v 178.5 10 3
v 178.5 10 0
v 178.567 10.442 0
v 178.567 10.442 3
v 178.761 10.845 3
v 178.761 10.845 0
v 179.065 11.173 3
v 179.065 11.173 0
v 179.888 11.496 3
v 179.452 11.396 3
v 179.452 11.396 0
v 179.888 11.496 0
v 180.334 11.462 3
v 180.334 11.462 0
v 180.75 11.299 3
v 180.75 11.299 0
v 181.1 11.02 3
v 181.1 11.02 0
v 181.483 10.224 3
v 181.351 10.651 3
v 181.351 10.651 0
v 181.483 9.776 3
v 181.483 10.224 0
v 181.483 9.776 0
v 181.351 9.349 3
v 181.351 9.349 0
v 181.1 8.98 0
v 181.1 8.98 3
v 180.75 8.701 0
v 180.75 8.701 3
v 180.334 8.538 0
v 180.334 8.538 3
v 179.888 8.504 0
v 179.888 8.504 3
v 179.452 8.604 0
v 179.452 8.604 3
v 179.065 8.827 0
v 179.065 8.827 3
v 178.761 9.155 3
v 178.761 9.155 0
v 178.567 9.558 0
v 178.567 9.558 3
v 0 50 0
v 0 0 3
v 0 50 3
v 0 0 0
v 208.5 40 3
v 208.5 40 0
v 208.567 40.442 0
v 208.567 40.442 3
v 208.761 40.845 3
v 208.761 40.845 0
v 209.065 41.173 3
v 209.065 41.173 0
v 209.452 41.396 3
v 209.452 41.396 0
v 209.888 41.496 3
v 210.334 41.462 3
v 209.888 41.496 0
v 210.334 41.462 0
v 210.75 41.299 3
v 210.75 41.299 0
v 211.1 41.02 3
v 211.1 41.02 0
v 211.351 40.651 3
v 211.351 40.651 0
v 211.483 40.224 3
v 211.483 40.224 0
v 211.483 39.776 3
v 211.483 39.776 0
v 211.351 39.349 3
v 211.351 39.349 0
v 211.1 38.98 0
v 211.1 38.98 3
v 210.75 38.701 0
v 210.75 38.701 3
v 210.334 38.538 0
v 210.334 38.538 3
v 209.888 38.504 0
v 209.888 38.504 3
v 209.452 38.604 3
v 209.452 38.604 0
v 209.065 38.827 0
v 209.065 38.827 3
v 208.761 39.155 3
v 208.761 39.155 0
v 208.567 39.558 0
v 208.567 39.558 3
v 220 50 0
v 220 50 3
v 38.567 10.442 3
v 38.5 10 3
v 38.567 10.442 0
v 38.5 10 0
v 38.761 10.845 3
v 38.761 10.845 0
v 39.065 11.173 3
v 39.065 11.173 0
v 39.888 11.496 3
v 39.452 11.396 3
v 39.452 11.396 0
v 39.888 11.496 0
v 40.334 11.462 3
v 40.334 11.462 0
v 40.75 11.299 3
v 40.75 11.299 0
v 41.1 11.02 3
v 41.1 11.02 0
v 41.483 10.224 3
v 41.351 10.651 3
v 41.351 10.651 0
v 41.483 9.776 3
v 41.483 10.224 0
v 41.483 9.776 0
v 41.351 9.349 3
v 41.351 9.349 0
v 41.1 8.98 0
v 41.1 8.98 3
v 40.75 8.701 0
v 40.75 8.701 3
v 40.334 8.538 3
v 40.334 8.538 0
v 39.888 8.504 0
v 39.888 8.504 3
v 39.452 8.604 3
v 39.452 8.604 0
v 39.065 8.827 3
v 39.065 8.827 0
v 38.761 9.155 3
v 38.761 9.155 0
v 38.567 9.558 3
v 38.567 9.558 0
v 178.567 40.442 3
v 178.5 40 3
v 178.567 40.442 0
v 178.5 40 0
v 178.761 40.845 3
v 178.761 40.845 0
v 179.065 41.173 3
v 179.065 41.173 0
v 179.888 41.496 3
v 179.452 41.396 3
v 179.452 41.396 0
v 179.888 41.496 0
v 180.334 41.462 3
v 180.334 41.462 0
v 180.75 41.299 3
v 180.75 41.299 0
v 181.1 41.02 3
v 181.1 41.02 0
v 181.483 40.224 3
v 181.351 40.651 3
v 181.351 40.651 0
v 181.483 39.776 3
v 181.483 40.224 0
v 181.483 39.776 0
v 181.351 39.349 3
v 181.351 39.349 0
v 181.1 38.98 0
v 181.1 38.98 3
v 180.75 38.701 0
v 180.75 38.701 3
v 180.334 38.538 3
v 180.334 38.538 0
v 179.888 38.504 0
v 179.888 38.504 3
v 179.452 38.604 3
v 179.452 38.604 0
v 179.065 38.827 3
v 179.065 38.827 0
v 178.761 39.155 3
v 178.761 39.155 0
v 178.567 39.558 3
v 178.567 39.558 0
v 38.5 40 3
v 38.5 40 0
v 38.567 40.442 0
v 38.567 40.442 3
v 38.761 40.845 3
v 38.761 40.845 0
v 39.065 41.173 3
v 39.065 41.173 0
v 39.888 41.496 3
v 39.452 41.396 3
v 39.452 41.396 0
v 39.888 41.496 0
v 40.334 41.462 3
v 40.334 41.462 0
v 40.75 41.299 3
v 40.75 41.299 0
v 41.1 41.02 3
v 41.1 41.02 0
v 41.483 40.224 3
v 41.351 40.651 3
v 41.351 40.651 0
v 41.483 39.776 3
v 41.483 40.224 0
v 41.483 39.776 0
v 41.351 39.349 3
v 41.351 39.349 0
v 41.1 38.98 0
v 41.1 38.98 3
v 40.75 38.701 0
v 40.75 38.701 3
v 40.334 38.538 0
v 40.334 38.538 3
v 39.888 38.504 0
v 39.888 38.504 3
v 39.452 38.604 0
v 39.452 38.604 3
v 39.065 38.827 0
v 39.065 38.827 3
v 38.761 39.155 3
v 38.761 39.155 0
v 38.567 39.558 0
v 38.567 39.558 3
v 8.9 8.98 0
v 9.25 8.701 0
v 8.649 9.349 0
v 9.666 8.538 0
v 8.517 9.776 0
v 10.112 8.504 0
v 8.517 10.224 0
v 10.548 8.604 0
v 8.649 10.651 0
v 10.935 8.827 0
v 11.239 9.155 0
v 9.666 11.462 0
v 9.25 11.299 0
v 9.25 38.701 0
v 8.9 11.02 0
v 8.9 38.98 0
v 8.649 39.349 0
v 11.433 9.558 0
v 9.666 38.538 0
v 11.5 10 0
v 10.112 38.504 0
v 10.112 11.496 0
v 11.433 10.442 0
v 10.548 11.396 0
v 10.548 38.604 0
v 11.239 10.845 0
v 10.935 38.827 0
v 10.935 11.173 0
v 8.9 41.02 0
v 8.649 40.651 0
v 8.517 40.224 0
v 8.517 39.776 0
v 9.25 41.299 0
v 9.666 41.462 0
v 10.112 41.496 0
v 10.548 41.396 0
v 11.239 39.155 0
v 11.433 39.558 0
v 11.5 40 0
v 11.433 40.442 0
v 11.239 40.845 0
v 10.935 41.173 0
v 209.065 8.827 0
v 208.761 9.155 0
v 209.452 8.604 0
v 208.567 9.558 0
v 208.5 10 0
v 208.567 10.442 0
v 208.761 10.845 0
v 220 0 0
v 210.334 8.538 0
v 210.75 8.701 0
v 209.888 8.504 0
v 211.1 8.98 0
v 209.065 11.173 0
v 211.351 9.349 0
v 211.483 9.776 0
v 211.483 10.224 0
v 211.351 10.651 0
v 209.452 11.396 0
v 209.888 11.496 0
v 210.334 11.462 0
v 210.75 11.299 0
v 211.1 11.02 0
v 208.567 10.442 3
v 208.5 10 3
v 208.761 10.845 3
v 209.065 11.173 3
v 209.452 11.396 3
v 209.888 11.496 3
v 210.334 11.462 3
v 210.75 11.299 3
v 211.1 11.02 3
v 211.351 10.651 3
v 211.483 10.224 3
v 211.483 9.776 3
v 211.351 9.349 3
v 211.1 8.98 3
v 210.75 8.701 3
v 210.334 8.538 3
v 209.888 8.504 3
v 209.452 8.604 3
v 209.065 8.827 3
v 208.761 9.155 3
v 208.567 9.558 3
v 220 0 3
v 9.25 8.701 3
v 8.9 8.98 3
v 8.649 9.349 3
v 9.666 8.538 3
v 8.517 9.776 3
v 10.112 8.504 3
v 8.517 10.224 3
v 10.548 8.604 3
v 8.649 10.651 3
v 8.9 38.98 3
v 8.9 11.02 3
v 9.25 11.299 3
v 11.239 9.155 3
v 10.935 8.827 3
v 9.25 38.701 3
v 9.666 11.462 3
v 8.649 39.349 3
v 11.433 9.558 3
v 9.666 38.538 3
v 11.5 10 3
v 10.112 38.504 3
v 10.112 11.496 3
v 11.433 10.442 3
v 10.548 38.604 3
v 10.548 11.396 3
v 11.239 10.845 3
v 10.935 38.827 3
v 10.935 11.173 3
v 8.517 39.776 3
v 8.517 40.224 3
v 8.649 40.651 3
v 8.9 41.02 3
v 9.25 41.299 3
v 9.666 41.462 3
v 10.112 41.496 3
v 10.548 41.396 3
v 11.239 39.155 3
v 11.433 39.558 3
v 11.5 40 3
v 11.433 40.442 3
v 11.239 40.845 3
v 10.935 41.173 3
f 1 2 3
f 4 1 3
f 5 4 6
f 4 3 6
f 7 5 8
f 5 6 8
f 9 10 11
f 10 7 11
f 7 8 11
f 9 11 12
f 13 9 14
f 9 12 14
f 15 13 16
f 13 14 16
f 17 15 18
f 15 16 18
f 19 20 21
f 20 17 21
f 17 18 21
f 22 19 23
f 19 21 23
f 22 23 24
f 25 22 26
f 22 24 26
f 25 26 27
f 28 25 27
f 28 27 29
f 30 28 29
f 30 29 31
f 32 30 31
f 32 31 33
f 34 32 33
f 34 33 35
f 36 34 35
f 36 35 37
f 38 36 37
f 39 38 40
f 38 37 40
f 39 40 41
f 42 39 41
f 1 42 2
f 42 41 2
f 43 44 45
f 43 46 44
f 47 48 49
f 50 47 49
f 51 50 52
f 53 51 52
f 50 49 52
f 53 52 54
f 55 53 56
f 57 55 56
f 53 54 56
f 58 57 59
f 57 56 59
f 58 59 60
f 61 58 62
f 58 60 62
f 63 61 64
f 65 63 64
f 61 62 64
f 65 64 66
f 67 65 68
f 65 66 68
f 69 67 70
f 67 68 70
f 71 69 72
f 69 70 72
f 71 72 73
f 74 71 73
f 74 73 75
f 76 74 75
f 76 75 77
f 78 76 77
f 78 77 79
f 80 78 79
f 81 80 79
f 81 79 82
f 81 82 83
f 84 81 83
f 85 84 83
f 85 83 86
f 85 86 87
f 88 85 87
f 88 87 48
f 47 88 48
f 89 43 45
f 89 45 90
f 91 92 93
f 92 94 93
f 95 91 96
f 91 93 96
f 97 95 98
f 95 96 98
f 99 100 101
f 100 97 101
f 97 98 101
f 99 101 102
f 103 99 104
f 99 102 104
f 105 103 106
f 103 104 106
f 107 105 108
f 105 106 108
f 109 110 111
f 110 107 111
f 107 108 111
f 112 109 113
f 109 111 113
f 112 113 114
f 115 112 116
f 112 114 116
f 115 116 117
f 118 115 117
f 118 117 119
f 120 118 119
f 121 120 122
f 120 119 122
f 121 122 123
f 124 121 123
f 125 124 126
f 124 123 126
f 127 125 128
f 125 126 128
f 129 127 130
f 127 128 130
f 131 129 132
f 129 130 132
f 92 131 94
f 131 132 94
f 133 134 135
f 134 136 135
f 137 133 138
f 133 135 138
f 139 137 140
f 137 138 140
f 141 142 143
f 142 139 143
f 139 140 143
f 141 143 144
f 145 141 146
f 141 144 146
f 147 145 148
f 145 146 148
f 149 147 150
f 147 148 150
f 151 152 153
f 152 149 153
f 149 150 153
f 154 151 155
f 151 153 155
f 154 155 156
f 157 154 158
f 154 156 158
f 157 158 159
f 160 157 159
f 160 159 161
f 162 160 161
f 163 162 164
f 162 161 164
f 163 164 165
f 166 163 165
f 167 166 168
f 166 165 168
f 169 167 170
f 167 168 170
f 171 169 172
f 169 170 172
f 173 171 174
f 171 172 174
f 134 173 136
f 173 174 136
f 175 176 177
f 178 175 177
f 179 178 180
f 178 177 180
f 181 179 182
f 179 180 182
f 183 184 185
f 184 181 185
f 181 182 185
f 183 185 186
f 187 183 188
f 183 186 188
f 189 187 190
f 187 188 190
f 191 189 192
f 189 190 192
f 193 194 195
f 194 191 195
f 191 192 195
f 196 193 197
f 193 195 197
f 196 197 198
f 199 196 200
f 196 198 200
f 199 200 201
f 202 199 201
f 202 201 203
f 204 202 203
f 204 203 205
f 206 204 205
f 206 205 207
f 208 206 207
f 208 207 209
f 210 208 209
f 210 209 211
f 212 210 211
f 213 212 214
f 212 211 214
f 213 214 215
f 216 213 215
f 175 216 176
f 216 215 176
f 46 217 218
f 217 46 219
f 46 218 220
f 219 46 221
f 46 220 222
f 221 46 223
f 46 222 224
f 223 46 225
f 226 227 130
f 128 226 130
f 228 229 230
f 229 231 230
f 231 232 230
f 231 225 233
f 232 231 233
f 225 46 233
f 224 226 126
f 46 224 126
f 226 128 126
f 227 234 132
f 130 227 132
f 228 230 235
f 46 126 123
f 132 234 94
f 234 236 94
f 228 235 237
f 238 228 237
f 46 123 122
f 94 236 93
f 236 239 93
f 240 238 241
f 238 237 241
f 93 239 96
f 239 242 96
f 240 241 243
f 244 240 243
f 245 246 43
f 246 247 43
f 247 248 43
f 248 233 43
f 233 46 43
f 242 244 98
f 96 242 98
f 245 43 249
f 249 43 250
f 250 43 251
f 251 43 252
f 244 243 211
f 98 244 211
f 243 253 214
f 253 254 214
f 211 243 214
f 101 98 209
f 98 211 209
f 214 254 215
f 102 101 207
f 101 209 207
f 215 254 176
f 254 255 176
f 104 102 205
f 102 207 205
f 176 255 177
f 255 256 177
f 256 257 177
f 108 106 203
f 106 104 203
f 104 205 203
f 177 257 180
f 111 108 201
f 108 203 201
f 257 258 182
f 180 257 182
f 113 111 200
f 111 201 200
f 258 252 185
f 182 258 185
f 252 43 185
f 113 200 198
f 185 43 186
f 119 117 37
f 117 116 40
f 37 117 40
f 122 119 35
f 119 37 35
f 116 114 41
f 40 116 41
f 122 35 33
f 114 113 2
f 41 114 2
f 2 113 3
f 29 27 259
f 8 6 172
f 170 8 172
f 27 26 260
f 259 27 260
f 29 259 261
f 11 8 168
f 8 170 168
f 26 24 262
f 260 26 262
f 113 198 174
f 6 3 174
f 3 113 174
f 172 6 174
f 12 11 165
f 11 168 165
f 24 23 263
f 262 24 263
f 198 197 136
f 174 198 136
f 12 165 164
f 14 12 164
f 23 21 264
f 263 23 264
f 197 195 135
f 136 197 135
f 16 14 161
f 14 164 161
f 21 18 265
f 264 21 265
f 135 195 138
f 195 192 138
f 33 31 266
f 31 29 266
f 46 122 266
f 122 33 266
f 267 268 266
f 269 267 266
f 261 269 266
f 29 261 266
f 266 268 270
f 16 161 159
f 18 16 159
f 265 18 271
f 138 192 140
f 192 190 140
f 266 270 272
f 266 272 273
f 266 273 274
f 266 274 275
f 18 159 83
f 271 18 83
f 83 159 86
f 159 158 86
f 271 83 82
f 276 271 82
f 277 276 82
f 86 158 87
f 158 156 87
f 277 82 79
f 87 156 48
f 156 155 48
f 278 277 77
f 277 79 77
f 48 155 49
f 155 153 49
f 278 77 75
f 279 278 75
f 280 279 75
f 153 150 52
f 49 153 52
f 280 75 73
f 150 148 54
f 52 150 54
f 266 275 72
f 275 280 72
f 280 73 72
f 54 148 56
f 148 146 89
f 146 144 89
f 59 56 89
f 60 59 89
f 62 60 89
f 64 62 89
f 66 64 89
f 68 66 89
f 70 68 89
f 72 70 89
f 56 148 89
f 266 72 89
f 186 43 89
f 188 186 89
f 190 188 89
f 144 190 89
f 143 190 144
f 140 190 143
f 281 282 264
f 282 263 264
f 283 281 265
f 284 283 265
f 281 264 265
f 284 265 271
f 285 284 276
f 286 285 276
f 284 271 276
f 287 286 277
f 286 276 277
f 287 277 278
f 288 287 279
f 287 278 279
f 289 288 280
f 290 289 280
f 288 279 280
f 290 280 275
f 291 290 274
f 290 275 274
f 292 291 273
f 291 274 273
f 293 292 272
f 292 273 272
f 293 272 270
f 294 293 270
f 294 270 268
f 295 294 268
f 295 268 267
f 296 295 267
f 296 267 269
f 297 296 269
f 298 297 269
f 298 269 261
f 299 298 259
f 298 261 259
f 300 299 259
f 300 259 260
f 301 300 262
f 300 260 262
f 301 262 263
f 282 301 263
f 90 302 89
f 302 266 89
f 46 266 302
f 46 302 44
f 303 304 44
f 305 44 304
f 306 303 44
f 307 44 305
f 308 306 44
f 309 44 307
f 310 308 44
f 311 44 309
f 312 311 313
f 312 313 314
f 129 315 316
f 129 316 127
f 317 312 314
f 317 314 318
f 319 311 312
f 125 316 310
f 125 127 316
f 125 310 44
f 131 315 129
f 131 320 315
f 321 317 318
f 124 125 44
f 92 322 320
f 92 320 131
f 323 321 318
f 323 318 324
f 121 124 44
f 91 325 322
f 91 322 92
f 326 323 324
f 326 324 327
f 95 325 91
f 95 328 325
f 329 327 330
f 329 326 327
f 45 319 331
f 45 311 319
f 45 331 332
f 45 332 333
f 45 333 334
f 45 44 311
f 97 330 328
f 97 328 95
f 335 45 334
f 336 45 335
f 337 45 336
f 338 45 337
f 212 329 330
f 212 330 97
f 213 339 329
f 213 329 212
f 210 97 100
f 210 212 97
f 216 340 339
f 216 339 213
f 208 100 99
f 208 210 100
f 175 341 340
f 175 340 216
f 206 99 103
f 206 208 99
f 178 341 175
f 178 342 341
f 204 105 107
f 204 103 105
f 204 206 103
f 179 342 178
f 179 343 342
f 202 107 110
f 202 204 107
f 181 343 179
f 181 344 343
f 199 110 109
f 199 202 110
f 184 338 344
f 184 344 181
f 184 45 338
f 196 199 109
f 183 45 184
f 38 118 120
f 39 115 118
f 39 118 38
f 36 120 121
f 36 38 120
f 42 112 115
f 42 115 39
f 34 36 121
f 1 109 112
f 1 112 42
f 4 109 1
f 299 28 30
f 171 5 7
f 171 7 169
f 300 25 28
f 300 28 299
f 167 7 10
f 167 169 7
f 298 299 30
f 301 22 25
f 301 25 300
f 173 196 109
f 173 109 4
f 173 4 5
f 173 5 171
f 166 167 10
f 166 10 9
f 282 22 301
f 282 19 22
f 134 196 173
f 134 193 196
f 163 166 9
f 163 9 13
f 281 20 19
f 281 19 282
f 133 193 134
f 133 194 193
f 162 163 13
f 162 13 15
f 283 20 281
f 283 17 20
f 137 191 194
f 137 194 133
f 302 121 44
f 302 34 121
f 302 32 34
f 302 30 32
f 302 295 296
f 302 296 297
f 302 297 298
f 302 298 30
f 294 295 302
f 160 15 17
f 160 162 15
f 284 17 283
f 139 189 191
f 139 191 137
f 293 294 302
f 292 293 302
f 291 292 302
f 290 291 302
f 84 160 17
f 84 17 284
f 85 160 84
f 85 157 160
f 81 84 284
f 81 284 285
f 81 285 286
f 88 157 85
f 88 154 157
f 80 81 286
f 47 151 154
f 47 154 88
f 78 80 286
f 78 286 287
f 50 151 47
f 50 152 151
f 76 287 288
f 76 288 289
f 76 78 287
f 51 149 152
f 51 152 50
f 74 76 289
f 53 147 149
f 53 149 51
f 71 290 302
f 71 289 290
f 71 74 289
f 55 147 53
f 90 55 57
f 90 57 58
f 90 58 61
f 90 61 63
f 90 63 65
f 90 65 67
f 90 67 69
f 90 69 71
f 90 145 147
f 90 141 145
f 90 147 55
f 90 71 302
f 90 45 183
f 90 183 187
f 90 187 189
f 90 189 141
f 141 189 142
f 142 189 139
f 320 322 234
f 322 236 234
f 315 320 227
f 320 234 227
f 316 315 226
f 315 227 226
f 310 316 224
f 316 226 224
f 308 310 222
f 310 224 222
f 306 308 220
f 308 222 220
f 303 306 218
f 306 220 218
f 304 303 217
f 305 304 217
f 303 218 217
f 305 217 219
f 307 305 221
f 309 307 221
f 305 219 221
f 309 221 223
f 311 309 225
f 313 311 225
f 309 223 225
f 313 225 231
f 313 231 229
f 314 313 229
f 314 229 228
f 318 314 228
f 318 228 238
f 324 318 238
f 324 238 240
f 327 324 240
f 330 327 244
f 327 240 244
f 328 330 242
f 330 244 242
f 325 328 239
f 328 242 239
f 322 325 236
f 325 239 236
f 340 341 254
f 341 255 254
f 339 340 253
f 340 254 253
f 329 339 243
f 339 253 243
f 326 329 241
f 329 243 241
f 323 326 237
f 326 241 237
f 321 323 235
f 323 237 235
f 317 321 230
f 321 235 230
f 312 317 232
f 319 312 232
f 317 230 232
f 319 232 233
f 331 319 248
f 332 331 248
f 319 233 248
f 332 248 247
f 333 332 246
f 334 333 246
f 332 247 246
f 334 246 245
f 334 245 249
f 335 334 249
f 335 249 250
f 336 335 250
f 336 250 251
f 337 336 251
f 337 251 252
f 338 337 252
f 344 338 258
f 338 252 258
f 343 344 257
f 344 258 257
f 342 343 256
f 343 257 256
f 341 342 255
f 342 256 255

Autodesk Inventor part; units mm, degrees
ref_plane "YZ Plane" through (0, 0, 0) normal (1, 0, 0) x (0, 1, 0)
ref_plane "XZ Plane" through (0, 0, 0) normal (0, 1, 0) x (-1, 0, 0)
ref_plane "XY Plane" through (0, 0, 0) normal (0, 0, 1) x (1, 0, 0)
sketch "Sketch1" plane through (0, 0, 0) normal (0, 0, 1) x (1, 0, 0)
  circle A0 centre (6.0619, 42.5) radius 1.5 projected
  circle A1 centre (6.0619, 7.5) radius 1.5 projected
  circle A2 centre (28.8092, 42.5) radius 1.5 projected
  circle A3 centre (28.8092, 7.5) radius 1.5 projected
  line L0 (34.8712, 0) -> (0, 0) projected
  line L1 (34.8712, 0) -> (34.8712, 50) projected
  line L2 (0, 50) -> (34.8712, 50) projected
  line L3 (0, 0) -> (0, 50) projected
  line L4 (0, 0) -> (220, 0)
  line L5 (220, 0) -> (220, 50)
  line L6 (220, 50) -> (0, 50)
  line L7 (0, 50) -> (0, 0)
  point P0 (19, 50)
  point P1 (19, 0)
  dimension "d0" = 220
  dimension "d1" = 50
extrude "Extrusion1" add sketch "Sketch1" along normal blind 3 contours A0 | A1 | A2 | A3 | L0 L3 L2 L1 | L1 L6 L5 L4
sketch "Sketch2" plane through (0, 0, 0) normal (0, 0, -1) x (-1, 0, 0)
  arc A0 (-300, 50) -> (-310, 40) centre (-300, 40) ccw projected
  line L0 (-310, 40) -> (-310, 10) projected
  arc A1 (-310, 10) -> (-300, 0) centre (-300, 10) ccw projected
  line L1 (-300, 0) -> (-170, 0) projected
  line L2 (-170, 0) -> (-170, 50) projected
  line L3 (-170, 50) -> (-300, 50) projected
  circle A2 centre (-250.5156, 19.2053) radius 1.75 projected
  circle A3 centre (-250.7947, 30.5156) radius 1.75 projected
  circle A4 centre (-239.2053, 19.4844) radius 1.75 projected
  circle A5 centre (-239.4844, 30.7947) radius 1.75 projected
  circle A6 centre (-263.75, 25) radius 2.6 projected
  circle A7 centre (-280, 25) radius 5 projected
  circle A8 centre (-296.25, 25) radius 2.6 projected
  circle A9 centre (-245, 25) radius 5.5 projected
  circle A10 centre (-210, 40) radius 1.5 projected
  circle A11 centre (-210, 10) radius 1.5 projected
  circle A12 centre (-180, 40) radius 1.5 projected
  circle A13 centre (-180, 10) radius 1.5 projected
  line L4 (-50, 0) -> (55, 0) projected
  arc A14 (55, 0) -> (65, 10) centre (55, 10) ccw projected
  line L5 (65, 10) -> (65, 40) projected
  arc A15 (65, 40) -> (55, 50) centre (55, 40) ccw projected
  line L6 (55, 50) -> (-50, 50) projected
  line L7 (-50, 50) -> (-50, 0) projected
  circle A16 centre (-40, 40) radius 1.5 projected
  circle A17 centre (-40, 10) radius 1.5 projected
  circle A18 centre (36, 25) radius 5 projected
  circle A19 centre (19.75, 25) radius 2.6 projected
  circle A20 centre (52.25, 25) radius 2.6 projected
  circle A21 centre (-10, 40) radius 1.5 projected
  circle A22 centre (-10, 10) radius 1.5 projected
  point P0 (0, 0)
extrude "Extrusion2" cut sketch "Sketch2" against normal through all contours A10 | A11 | A12 | A13 | A16 | A17
ref_plane "Work Plane1" through (110, 0, 0) normal (1, 0, 0) x (0, 0, -1)
mirror "Mirror1" about plane through (110, 0, 0) normal (1, 0, 0) of "Extrusion2"
properties part number "arm1" material "Polycarbonate, Clear"
